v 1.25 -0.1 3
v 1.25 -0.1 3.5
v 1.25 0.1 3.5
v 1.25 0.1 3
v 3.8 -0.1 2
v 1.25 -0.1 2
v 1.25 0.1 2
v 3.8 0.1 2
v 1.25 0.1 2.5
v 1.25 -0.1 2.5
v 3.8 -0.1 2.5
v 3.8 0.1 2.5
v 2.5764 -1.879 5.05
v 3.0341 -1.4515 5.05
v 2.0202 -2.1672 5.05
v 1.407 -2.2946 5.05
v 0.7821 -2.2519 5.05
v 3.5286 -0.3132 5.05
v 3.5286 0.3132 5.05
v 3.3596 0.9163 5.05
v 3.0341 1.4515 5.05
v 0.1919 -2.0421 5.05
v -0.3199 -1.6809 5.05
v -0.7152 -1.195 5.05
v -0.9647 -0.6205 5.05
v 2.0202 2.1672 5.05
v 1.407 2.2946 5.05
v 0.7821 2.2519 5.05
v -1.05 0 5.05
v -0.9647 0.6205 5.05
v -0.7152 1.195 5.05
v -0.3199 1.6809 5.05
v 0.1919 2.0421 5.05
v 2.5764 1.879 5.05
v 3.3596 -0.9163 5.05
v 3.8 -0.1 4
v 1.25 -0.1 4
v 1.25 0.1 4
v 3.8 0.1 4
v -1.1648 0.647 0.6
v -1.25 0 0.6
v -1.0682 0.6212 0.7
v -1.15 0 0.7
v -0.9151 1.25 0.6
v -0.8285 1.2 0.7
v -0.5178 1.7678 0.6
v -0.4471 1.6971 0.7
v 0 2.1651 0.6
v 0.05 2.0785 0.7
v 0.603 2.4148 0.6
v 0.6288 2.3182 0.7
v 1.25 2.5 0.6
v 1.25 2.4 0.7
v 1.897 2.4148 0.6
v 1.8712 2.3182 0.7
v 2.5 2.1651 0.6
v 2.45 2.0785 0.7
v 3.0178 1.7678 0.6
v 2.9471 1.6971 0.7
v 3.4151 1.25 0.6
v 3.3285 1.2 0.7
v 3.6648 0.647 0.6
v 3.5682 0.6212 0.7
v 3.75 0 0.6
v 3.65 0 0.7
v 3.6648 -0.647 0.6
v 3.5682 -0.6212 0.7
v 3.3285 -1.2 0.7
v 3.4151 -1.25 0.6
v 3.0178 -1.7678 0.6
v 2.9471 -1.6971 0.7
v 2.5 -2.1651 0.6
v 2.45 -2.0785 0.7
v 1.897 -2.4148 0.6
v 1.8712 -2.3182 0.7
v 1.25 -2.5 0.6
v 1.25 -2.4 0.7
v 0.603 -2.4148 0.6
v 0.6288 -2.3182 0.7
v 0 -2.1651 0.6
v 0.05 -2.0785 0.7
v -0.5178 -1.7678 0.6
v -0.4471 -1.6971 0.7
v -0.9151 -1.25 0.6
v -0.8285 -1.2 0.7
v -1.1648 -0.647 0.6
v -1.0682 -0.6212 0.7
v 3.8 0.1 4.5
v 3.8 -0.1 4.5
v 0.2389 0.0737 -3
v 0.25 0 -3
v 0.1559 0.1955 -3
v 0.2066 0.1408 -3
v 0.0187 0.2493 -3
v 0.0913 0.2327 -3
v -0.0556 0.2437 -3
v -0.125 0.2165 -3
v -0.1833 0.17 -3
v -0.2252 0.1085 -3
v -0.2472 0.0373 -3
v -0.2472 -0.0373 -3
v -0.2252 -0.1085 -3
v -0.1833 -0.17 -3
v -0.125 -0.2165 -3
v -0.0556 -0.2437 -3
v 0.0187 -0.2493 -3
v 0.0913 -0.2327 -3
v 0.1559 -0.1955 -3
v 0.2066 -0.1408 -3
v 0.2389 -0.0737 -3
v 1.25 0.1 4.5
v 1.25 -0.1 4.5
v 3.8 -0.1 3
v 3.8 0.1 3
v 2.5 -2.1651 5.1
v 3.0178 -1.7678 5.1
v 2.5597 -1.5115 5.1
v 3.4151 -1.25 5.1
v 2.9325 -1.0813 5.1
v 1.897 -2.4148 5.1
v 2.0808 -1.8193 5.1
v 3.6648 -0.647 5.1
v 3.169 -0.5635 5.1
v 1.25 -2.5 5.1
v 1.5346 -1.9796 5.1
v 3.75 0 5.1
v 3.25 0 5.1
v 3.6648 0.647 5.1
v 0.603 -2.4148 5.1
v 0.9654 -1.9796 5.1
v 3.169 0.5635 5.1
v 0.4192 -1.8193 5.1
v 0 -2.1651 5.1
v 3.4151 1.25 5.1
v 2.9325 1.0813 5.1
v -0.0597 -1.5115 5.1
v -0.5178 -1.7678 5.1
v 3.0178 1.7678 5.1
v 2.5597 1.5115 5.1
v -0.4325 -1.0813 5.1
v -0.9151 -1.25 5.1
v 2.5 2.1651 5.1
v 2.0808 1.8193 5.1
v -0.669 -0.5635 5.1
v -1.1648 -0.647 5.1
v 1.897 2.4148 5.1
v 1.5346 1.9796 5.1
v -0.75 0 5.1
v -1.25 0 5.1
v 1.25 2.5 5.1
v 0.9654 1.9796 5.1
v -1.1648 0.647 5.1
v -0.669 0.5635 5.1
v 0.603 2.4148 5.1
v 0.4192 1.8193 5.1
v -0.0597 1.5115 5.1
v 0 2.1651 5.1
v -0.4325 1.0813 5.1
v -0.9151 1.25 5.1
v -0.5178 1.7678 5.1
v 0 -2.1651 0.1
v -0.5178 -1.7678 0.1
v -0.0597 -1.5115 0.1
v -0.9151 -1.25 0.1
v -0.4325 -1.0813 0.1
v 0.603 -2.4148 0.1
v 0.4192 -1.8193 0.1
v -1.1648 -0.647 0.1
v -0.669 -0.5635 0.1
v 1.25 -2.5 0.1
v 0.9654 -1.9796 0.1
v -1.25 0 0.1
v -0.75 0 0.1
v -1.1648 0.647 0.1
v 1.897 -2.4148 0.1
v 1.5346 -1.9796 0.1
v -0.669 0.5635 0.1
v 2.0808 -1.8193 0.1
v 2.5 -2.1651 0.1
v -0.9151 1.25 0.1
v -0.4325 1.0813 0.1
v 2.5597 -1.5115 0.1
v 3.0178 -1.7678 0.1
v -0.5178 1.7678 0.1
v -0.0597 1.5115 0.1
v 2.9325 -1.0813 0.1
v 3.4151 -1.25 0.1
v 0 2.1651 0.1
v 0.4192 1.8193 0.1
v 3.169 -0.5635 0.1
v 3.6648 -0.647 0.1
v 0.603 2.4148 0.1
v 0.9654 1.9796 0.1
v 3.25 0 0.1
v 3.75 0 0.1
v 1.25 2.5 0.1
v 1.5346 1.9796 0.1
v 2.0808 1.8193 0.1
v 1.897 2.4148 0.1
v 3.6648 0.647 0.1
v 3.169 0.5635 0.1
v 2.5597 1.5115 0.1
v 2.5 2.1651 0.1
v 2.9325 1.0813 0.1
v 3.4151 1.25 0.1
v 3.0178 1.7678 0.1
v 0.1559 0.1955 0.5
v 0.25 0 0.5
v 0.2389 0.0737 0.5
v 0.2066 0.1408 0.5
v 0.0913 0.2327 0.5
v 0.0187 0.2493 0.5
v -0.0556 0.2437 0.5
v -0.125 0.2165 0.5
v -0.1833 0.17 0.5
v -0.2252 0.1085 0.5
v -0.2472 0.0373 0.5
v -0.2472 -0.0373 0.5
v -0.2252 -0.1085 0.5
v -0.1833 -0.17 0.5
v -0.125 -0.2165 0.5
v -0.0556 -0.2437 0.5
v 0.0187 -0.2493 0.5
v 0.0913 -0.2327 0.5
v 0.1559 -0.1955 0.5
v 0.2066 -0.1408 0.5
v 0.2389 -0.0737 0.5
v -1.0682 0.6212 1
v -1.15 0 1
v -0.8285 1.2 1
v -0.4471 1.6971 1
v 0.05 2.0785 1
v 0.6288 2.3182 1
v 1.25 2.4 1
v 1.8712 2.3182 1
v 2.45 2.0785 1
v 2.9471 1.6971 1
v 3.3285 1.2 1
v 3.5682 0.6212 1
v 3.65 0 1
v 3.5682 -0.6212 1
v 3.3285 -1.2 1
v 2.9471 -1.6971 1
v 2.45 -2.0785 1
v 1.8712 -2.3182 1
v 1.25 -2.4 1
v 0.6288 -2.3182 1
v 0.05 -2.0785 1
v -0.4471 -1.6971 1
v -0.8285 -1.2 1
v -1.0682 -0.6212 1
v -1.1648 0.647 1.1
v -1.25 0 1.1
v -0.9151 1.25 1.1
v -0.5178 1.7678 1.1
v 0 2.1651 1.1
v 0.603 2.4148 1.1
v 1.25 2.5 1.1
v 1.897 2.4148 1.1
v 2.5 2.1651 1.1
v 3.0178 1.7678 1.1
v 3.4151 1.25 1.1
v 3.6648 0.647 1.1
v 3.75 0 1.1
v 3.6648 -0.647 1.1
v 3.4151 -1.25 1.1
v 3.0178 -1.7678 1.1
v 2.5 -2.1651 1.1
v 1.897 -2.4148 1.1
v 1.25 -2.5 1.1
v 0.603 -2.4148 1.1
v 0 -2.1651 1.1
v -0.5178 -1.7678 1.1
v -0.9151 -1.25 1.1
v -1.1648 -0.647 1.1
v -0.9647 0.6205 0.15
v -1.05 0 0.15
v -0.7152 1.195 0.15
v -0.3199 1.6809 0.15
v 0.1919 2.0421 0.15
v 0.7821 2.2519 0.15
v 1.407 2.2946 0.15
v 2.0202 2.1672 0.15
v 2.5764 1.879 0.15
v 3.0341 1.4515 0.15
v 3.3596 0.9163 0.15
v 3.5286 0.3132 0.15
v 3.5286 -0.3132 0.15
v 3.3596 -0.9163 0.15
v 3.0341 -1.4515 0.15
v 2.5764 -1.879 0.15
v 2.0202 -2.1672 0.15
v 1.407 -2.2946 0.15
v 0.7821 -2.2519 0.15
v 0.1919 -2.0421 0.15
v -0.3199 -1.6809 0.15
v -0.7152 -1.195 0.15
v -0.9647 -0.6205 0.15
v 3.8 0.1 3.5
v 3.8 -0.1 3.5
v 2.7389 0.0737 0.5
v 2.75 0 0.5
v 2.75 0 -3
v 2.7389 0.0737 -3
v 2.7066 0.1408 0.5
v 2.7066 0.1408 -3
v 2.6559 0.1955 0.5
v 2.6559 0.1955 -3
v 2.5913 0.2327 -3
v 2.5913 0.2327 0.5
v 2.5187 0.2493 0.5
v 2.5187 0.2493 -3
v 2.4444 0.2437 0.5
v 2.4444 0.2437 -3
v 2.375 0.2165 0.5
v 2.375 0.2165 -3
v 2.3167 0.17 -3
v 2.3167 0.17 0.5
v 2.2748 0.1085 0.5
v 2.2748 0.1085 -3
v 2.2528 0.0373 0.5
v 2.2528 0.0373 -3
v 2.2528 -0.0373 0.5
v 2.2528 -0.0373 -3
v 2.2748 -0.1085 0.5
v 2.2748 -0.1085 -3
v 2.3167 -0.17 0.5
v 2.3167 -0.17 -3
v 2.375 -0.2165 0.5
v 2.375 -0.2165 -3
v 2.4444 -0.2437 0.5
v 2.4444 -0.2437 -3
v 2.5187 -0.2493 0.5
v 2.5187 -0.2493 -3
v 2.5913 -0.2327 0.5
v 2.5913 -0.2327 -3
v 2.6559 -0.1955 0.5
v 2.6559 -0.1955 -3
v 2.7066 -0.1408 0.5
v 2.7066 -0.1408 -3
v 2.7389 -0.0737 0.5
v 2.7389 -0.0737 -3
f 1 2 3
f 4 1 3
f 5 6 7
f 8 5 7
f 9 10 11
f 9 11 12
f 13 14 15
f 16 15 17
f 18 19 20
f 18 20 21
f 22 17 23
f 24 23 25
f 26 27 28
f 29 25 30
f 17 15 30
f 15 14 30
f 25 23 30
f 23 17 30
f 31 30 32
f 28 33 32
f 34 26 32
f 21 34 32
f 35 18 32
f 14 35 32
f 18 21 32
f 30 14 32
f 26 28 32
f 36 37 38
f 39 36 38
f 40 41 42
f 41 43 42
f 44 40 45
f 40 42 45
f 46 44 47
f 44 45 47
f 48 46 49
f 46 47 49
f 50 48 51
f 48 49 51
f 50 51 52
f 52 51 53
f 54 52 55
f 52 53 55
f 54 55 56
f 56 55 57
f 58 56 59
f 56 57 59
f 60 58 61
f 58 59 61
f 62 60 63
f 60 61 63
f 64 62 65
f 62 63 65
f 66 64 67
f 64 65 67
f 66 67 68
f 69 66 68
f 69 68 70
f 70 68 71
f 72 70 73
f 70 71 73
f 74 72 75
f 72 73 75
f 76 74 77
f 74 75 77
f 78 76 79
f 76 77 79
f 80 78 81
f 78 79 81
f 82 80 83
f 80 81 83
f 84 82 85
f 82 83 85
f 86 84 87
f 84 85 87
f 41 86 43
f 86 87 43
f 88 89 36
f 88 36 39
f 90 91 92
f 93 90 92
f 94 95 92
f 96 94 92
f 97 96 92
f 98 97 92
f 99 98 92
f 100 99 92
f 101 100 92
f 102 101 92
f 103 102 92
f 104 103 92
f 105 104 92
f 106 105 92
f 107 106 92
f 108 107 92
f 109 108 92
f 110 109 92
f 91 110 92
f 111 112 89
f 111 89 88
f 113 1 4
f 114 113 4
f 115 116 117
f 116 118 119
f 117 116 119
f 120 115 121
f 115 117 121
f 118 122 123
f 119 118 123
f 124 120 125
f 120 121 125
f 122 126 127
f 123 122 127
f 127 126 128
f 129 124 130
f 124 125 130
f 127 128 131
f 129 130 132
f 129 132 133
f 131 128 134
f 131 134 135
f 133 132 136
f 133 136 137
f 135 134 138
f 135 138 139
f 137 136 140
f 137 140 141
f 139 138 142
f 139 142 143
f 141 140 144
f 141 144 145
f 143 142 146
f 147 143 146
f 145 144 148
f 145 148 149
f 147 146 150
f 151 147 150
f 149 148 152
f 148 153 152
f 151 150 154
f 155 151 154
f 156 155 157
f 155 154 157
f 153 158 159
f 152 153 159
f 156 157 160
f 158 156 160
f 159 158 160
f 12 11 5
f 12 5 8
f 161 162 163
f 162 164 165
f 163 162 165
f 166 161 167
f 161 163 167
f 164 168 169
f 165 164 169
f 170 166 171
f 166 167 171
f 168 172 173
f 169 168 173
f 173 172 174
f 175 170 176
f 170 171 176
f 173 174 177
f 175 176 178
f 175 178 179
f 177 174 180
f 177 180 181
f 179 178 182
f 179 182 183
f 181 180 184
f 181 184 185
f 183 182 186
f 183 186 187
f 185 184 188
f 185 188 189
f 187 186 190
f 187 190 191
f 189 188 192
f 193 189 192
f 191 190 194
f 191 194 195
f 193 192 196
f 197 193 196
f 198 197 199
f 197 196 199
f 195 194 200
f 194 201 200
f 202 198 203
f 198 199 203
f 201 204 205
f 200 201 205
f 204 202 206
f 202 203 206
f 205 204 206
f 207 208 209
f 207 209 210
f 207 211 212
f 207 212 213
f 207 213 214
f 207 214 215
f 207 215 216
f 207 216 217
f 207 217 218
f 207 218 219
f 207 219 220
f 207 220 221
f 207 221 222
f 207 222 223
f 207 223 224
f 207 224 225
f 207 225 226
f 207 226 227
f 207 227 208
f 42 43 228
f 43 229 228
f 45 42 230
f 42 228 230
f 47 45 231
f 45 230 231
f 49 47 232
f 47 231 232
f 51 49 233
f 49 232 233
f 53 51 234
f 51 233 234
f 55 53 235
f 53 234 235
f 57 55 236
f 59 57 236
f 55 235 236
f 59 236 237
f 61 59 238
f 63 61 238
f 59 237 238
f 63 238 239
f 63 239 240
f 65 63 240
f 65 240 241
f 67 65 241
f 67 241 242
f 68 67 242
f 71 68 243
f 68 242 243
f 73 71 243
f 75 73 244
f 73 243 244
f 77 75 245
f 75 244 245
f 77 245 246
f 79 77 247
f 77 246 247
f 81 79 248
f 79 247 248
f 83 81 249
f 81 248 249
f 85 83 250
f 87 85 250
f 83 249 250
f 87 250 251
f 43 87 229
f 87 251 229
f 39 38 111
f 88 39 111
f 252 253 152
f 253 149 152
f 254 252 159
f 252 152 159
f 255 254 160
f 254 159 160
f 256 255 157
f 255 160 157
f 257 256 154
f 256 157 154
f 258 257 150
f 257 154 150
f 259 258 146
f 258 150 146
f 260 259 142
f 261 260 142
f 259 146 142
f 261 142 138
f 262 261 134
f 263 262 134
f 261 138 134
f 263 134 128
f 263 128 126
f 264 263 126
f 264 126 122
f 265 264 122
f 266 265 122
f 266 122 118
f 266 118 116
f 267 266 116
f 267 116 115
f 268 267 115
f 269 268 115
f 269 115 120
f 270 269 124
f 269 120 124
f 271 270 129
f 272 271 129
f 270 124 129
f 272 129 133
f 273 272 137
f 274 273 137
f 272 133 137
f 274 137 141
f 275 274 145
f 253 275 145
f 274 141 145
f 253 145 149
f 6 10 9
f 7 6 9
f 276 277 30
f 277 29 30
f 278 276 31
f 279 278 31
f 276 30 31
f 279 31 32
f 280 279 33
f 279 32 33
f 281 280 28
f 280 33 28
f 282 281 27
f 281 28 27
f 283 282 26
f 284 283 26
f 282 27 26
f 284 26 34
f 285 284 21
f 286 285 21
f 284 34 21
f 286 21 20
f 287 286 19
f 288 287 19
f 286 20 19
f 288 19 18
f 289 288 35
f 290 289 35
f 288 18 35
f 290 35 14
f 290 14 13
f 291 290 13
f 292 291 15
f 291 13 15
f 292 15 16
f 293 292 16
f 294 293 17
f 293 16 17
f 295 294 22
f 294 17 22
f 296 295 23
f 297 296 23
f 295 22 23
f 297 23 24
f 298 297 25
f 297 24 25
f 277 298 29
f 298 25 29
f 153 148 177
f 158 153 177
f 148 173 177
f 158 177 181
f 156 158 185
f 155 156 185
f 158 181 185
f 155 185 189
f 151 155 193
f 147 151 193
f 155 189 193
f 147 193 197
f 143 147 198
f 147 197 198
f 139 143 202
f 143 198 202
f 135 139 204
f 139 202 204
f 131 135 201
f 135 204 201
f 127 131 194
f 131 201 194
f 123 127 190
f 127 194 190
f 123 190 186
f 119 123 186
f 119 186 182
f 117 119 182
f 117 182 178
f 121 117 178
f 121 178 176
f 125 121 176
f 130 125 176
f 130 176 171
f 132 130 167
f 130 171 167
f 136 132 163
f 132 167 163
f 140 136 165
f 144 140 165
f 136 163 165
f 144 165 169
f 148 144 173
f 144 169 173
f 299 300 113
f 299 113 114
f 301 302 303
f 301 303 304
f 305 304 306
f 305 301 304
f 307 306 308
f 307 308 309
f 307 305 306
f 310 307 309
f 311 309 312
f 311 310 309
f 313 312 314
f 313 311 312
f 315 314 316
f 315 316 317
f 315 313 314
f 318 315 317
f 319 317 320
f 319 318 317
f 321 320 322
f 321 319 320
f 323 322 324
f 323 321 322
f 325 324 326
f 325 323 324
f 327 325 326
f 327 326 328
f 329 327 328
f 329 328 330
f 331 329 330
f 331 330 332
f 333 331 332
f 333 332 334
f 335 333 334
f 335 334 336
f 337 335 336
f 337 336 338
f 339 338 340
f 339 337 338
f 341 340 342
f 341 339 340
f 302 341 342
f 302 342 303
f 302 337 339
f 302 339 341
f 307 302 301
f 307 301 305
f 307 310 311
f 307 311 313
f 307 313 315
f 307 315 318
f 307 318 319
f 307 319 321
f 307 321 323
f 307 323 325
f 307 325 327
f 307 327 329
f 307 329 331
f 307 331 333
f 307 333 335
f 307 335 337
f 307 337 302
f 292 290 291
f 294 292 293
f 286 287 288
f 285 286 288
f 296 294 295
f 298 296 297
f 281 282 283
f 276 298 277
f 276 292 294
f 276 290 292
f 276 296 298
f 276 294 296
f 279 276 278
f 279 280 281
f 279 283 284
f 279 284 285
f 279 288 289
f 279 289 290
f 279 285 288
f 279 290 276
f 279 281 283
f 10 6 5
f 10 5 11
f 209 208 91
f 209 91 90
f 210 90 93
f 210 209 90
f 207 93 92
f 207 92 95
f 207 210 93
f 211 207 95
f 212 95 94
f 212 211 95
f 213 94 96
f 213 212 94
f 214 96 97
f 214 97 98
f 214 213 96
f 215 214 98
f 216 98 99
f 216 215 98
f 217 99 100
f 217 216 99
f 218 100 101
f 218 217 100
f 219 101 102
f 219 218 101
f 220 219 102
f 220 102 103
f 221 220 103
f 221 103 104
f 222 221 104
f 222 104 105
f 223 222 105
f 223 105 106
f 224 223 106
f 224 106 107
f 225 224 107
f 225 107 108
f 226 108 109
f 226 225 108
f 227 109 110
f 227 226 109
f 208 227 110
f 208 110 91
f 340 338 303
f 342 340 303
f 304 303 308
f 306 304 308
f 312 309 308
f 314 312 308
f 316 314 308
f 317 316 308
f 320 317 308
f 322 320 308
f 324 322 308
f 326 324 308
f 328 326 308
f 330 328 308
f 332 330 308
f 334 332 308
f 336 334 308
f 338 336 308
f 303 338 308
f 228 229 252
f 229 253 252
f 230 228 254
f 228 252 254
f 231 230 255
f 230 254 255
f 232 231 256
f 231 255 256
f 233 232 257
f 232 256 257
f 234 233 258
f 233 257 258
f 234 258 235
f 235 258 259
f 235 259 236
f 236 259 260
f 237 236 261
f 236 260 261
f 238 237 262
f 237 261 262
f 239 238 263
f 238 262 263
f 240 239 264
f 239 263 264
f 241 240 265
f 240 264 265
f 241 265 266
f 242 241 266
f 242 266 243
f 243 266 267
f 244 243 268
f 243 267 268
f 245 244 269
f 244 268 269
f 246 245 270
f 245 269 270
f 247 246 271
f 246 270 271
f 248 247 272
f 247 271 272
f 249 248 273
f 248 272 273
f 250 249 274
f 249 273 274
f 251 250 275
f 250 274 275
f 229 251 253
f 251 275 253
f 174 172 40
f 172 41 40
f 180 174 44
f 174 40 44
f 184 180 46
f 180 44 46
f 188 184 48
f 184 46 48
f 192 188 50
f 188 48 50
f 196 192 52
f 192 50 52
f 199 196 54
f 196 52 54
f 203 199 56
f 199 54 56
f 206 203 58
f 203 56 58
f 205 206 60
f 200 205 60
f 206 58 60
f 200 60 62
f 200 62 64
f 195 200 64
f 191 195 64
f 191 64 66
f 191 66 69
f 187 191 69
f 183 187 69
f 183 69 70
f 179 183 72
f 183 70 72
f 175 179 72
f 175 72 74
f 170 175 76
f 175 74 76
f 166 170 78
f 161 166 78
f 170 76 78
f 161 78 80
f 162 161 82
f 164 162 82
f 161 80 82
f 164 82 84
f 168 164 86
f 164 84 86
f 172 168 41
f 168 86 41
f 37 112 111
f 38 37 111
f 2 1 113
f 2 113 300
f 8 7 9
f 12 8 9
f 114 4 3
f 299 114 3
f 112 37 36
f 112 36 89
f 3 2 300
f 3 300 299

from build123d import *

# Parameters (mm, degrees)
SKETCH002_W  = 2.3
SKETCH002_H  = 4.9
SKETCH003_R  = 0.25
PAD_DEPTH    = 3.5
SKETCH004_W  = 0.2
SKETCH004_H  = 0.5
PAD001_DEPTH = 2.55


with BuildPart() as revolution:
    # Sketch → Revolution (revolve)
    with BuildSketch(Plane.XZ):
        Polygon((-1.25, 0.1), (-1.25, 0.6), (-1.15, 0.7), (-1.15, 1), (-1.25, 1.1), (-1.25, 5.1), (-0.75, 5.1), (-0.75, 0.1), align=None)
    revolve(axis=Axis((1.25, 0, 7.548619), (0, 0, -1)))


with BuildPart() as revolution001:
    # Sketch002 → Revolution001 (revolve)
    with BuildSketch(Plane.XZ):
        with Locations((0.1, 2.6)):
            Rectangle(SKETCH002_W, SKETCH002_H)
    revolve(axis=Axis((1.25, 0, 4.680116), (0, 0, -1)))


with BuildPart() as pad:
    # Sketch003 → Pad (new body)
    with BuildSketch(Plane.XY.offset(0.5)):
        Circle(SKETCH003_R)
        with Locations((2.5, 0)):
            Circle(SKETCH003_R)
    extrude(amount=-PAD_DEPTH)


with BuildPart() as pad001:
    # Sketch004 → Pad001 (new body)
    with BuildSketch(Plane.YZ.offset(1.25)):
        with Locations((0, 2.25)):
            Rectangle(SKETCH004_W, SKETCH004_H)
        with Locations((0, 3.25)):
            Rectangle(SKETCH004_W, SKETCH004_H)
        with Locations((0, 4.25)):
            Rectangle(SKETCH004_W, SKETCH004_H)
    extrude(amount=PAD001_DEPTH)


solid = Compound([revolution.part, revolution001.part, pad.part, pad001.part])
